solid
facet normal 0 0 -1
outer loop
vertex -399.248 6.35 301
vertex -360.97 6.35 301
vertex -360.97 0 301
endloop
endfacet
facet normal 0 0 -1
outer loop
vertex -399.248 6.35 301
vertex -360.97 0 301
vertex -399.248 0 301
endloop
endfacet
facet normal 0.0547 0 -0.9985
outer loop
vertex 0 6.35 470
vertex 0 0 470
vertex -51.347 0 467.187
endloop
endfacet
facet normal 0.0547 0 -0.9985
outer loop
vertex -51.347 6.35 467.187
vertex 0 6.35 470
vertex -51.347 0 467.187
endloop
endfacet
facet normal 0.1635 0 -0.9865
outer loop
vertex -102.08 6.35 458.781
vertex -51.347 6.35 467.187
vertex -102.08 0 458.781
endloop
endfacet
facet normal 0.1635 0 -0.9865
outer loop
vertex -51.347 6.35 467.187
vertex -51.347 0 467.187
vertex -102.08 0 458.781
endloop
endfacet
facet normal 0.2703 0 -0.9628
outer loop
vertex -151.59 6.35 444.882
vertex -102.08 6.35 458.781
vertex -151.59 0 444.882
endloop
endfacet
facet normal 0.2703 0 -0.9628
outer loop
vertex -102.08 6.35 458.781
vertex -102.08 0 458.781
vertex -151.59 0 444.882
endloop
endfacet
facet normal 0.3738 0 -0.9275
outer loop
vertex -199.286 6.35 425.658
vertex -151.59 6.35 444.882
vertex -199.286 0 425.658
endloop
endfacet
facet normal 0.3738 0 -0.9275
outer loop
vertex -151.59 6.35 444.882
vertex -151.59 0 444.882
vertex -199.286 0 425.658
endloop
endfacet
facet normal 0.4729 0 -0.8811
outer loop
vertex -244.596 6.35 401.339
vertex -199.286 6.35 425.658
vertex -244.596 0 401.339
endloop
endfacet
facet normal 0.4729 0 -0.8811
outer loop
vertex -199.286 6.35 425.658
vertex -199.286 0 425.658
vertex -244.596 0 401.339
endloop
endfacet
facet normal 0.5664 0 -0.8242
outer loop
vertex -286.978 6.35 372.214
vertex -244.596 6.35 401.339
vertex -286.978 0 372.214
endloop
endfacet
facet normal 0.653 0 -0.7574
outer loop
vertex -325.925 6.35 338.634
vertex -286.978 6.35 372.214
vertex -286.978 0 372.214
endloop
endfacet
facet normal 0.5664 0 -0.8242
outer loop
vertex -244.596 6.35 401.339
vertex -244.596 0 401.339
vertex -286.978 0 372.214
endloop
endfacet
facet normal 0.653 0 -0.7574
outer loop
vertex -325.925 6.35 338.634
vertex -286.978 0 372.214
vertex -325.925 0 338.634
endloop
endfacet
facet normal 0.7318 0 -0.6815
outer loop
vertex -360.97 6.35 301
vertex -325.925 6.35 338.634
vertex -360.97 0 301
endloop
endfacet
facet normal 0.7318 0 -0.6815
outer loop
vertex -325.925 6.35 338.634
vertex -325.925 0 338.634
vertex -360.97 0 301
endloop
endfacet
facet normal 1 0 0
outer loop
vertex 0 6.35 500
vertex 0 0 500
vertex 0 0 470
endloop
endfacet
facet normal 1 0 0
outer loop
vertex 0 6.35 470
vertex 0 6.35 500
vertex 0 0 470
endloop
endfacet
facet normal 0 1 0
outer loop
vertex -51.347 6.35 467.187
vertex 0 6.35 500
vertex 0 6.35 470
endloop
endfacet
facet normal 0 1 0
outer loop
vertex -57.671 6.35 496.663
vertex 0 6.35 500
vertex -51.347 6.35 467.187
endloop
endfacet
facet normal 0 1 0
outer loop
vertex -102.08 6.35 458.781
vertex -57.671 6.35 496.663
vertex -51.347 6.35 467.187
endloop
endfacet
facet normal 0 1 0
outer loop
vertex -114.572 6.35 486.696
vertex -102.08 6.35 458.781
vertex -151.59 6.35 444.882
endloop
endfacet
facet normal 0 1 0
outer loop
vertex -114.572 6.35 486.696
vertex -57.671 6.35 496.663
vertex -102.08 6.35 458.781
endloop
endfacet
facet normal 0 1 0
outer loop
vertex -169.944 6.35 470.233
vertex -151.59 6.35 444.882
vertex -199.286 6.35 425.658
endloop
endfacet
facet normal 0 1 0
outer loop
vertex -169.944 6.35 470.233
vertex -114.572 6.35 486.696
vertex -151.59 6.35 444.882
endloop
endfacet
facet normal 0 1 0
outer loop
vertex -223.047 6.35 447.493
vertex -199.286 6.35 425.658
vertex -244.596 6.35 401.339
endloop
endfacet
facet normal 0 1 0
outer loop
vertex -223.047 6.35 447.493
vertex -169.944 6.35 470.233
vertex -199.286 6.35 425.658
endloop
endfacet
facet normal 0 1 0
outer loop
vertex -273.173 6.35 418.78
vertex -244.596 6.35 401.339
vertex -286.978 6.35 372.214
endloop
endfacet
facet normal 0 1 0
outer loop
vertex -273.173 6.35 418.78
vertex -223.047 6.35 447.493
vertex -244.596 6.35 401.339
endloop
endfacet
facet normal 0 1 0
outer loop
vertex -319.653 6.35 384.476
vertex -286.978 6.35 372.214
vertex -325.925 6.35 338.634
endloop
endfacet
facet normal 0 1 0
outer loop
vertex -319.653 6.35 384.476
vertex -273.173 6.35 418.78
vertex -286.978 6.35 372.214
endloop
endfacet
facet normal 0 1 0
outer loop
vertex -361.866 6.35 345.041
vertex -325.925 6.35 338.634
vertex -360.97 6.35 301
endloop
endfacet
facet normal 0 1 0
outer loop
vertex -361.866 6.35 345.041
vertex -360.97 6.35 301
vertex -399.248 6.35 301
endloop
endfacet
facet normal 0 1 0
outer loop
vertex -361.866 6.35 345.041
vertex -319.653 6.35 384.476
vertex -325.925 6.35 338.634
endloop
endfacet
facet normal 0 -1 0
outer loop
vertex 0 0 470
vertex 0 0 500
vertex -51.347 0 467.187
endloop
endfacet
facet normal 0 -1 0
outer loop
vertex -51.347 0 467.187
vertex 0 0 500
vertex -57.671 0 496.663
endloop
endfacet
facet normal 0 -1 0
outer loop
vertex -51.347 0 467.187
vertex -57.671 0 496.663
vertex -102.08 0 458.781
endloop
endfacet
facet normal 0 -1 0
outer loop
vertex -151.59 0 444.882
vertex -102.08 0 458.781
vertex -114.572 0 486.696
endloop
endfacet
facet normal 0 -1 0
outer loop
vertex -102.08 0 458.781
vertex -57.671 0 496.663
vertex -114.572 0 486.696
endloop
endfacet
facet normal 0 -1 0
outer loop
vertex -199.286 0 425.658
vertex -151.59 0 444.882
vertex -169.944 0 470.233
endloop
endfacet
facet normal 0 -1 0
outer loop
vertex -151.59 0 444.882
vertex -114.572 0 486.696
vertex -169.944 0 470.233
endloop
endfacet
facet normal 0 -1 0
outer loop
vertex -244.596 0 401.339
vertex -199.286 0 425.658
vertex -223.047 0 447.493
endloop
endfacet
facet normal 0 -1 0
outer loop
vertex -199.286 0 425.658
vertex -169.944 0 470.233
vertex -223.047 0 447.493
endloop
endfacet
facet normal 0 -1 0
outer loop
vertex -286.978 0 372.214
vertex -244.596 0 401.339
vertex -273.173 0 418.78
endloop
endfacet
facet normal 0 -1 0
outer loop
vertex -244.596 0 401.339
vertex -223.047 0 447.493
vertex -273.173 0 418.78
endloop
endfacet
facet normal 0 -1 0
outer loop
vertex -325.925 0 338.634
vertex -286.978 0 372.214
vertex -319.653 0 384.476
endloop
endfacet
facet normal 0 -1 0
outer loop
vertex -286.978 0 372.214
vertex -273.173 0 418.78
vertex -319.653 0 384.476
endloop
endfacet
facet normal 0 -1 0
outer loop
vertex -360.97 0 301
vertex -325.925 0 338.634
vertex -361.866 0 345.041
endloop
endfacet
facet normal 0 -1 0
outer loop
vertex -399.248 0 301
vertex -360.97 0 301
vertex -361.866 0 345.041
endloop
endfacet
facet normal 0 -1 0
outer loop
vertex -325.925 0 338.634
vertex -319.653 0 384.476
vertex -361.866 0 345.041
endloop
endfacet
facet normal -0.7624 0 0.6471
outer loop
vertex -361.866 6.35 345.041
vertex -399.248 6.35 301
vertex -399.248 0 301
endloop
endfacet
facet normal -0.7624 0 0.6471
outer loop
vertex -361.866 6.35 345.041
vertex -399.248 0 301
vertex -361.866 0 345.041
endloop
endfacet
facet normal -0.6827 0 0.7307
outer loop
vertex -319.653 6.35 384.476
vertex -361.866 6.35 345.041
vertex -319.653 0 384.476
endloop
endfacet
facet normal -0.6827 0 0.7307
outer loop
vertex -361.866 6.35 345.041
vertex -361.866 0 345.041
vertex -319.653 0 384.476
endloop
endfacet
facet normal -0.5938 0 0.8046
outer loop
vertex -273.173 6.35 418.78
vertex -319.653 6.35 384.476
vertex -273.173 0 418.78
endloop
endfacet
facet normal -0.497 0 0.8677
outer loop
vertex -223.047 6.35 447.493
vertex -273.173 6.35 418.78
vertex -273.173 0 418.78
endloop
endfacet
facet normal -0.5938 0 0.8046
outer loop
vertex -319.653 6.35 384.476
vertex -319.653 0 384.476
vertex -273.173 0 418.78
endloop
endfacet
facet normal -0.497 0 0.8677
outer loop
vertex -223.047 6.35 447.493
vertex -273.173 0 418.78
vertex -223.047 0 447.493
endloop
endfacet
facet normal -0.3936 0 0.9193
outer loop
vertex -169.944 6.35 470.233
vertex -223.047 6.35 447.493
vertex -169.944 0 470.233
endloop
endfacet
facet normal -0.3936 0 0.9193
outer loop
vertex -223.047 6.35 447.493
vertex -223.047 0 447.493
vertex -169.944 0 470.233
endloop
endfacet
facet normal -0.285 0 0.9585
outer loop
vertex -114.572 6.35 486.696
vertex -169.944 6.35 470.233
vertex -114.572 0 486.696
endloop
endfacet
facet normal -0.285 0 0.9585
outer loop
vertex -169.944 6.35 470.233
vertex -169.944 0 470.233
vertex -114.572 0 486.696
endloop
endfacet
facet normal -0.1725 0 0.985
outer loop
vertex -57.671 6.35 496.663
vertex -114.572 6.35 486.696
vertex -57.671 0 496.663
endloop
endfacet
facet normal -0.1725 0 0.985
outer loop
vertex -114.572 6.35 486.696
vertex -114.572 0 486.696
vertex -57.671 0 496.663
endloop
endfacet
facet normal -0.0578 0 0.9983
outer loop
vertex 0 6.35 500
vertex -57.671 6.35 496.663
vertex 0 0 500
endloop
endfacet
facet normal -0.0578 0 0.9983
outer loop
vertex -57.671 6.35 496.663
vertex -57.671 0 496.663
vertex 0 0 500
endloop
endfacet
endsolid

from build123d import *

# Parameters (mm, degrees)
BOSS_EXTRUDE1_DEPTH = 6.35
SKETCH3_W           = 30
SKETCH3_H           = 6.35
BOSS_EXTRUDE2_DEPTH = 80


with BuildPart() as part:
    # Sketch2 → Boss-Extrude1 (new body)
    with BuildSketch(Plane(origin=(0, 0, 0), x_dir=(1, 0, 0), z_dir=(0, 1, 0))):
        with BuildLine():
            ThreePointArc((0, -470), (-332.340187158, -332.340187158), (-470, 0))
            Line((-470, 0), (-500, 0))
            ThreePointArc((-500, 0), (-353.553390593, -353.553390593), (0, -500))
            Line((0, -500), (0, -470))
        make_face()
    extrude(amount=BOSS_EXTRUDE1_DEPTH)

    # Sketch3 → Boss-Extrude2 (add)
    with BuildSketch(Plane(origin=(0, 0, 0), x_dir=(-1, 0, 0), z_dir=(0, 0, -1))):
        with Locations((485, 3.175)):
            Rectangle(SKETCH3_W, SKETCH3_H)
    extrude(amount=BOSS_EXTRUDE2_DEPTH)

    # Split1
    split(bisect_by=Plane(origin=(0, 0, 301), x_dir=(-1, 0, 0), z_dir=(0, 0, -1)), keep=Keep.BOTTOM)


solid = part.part
